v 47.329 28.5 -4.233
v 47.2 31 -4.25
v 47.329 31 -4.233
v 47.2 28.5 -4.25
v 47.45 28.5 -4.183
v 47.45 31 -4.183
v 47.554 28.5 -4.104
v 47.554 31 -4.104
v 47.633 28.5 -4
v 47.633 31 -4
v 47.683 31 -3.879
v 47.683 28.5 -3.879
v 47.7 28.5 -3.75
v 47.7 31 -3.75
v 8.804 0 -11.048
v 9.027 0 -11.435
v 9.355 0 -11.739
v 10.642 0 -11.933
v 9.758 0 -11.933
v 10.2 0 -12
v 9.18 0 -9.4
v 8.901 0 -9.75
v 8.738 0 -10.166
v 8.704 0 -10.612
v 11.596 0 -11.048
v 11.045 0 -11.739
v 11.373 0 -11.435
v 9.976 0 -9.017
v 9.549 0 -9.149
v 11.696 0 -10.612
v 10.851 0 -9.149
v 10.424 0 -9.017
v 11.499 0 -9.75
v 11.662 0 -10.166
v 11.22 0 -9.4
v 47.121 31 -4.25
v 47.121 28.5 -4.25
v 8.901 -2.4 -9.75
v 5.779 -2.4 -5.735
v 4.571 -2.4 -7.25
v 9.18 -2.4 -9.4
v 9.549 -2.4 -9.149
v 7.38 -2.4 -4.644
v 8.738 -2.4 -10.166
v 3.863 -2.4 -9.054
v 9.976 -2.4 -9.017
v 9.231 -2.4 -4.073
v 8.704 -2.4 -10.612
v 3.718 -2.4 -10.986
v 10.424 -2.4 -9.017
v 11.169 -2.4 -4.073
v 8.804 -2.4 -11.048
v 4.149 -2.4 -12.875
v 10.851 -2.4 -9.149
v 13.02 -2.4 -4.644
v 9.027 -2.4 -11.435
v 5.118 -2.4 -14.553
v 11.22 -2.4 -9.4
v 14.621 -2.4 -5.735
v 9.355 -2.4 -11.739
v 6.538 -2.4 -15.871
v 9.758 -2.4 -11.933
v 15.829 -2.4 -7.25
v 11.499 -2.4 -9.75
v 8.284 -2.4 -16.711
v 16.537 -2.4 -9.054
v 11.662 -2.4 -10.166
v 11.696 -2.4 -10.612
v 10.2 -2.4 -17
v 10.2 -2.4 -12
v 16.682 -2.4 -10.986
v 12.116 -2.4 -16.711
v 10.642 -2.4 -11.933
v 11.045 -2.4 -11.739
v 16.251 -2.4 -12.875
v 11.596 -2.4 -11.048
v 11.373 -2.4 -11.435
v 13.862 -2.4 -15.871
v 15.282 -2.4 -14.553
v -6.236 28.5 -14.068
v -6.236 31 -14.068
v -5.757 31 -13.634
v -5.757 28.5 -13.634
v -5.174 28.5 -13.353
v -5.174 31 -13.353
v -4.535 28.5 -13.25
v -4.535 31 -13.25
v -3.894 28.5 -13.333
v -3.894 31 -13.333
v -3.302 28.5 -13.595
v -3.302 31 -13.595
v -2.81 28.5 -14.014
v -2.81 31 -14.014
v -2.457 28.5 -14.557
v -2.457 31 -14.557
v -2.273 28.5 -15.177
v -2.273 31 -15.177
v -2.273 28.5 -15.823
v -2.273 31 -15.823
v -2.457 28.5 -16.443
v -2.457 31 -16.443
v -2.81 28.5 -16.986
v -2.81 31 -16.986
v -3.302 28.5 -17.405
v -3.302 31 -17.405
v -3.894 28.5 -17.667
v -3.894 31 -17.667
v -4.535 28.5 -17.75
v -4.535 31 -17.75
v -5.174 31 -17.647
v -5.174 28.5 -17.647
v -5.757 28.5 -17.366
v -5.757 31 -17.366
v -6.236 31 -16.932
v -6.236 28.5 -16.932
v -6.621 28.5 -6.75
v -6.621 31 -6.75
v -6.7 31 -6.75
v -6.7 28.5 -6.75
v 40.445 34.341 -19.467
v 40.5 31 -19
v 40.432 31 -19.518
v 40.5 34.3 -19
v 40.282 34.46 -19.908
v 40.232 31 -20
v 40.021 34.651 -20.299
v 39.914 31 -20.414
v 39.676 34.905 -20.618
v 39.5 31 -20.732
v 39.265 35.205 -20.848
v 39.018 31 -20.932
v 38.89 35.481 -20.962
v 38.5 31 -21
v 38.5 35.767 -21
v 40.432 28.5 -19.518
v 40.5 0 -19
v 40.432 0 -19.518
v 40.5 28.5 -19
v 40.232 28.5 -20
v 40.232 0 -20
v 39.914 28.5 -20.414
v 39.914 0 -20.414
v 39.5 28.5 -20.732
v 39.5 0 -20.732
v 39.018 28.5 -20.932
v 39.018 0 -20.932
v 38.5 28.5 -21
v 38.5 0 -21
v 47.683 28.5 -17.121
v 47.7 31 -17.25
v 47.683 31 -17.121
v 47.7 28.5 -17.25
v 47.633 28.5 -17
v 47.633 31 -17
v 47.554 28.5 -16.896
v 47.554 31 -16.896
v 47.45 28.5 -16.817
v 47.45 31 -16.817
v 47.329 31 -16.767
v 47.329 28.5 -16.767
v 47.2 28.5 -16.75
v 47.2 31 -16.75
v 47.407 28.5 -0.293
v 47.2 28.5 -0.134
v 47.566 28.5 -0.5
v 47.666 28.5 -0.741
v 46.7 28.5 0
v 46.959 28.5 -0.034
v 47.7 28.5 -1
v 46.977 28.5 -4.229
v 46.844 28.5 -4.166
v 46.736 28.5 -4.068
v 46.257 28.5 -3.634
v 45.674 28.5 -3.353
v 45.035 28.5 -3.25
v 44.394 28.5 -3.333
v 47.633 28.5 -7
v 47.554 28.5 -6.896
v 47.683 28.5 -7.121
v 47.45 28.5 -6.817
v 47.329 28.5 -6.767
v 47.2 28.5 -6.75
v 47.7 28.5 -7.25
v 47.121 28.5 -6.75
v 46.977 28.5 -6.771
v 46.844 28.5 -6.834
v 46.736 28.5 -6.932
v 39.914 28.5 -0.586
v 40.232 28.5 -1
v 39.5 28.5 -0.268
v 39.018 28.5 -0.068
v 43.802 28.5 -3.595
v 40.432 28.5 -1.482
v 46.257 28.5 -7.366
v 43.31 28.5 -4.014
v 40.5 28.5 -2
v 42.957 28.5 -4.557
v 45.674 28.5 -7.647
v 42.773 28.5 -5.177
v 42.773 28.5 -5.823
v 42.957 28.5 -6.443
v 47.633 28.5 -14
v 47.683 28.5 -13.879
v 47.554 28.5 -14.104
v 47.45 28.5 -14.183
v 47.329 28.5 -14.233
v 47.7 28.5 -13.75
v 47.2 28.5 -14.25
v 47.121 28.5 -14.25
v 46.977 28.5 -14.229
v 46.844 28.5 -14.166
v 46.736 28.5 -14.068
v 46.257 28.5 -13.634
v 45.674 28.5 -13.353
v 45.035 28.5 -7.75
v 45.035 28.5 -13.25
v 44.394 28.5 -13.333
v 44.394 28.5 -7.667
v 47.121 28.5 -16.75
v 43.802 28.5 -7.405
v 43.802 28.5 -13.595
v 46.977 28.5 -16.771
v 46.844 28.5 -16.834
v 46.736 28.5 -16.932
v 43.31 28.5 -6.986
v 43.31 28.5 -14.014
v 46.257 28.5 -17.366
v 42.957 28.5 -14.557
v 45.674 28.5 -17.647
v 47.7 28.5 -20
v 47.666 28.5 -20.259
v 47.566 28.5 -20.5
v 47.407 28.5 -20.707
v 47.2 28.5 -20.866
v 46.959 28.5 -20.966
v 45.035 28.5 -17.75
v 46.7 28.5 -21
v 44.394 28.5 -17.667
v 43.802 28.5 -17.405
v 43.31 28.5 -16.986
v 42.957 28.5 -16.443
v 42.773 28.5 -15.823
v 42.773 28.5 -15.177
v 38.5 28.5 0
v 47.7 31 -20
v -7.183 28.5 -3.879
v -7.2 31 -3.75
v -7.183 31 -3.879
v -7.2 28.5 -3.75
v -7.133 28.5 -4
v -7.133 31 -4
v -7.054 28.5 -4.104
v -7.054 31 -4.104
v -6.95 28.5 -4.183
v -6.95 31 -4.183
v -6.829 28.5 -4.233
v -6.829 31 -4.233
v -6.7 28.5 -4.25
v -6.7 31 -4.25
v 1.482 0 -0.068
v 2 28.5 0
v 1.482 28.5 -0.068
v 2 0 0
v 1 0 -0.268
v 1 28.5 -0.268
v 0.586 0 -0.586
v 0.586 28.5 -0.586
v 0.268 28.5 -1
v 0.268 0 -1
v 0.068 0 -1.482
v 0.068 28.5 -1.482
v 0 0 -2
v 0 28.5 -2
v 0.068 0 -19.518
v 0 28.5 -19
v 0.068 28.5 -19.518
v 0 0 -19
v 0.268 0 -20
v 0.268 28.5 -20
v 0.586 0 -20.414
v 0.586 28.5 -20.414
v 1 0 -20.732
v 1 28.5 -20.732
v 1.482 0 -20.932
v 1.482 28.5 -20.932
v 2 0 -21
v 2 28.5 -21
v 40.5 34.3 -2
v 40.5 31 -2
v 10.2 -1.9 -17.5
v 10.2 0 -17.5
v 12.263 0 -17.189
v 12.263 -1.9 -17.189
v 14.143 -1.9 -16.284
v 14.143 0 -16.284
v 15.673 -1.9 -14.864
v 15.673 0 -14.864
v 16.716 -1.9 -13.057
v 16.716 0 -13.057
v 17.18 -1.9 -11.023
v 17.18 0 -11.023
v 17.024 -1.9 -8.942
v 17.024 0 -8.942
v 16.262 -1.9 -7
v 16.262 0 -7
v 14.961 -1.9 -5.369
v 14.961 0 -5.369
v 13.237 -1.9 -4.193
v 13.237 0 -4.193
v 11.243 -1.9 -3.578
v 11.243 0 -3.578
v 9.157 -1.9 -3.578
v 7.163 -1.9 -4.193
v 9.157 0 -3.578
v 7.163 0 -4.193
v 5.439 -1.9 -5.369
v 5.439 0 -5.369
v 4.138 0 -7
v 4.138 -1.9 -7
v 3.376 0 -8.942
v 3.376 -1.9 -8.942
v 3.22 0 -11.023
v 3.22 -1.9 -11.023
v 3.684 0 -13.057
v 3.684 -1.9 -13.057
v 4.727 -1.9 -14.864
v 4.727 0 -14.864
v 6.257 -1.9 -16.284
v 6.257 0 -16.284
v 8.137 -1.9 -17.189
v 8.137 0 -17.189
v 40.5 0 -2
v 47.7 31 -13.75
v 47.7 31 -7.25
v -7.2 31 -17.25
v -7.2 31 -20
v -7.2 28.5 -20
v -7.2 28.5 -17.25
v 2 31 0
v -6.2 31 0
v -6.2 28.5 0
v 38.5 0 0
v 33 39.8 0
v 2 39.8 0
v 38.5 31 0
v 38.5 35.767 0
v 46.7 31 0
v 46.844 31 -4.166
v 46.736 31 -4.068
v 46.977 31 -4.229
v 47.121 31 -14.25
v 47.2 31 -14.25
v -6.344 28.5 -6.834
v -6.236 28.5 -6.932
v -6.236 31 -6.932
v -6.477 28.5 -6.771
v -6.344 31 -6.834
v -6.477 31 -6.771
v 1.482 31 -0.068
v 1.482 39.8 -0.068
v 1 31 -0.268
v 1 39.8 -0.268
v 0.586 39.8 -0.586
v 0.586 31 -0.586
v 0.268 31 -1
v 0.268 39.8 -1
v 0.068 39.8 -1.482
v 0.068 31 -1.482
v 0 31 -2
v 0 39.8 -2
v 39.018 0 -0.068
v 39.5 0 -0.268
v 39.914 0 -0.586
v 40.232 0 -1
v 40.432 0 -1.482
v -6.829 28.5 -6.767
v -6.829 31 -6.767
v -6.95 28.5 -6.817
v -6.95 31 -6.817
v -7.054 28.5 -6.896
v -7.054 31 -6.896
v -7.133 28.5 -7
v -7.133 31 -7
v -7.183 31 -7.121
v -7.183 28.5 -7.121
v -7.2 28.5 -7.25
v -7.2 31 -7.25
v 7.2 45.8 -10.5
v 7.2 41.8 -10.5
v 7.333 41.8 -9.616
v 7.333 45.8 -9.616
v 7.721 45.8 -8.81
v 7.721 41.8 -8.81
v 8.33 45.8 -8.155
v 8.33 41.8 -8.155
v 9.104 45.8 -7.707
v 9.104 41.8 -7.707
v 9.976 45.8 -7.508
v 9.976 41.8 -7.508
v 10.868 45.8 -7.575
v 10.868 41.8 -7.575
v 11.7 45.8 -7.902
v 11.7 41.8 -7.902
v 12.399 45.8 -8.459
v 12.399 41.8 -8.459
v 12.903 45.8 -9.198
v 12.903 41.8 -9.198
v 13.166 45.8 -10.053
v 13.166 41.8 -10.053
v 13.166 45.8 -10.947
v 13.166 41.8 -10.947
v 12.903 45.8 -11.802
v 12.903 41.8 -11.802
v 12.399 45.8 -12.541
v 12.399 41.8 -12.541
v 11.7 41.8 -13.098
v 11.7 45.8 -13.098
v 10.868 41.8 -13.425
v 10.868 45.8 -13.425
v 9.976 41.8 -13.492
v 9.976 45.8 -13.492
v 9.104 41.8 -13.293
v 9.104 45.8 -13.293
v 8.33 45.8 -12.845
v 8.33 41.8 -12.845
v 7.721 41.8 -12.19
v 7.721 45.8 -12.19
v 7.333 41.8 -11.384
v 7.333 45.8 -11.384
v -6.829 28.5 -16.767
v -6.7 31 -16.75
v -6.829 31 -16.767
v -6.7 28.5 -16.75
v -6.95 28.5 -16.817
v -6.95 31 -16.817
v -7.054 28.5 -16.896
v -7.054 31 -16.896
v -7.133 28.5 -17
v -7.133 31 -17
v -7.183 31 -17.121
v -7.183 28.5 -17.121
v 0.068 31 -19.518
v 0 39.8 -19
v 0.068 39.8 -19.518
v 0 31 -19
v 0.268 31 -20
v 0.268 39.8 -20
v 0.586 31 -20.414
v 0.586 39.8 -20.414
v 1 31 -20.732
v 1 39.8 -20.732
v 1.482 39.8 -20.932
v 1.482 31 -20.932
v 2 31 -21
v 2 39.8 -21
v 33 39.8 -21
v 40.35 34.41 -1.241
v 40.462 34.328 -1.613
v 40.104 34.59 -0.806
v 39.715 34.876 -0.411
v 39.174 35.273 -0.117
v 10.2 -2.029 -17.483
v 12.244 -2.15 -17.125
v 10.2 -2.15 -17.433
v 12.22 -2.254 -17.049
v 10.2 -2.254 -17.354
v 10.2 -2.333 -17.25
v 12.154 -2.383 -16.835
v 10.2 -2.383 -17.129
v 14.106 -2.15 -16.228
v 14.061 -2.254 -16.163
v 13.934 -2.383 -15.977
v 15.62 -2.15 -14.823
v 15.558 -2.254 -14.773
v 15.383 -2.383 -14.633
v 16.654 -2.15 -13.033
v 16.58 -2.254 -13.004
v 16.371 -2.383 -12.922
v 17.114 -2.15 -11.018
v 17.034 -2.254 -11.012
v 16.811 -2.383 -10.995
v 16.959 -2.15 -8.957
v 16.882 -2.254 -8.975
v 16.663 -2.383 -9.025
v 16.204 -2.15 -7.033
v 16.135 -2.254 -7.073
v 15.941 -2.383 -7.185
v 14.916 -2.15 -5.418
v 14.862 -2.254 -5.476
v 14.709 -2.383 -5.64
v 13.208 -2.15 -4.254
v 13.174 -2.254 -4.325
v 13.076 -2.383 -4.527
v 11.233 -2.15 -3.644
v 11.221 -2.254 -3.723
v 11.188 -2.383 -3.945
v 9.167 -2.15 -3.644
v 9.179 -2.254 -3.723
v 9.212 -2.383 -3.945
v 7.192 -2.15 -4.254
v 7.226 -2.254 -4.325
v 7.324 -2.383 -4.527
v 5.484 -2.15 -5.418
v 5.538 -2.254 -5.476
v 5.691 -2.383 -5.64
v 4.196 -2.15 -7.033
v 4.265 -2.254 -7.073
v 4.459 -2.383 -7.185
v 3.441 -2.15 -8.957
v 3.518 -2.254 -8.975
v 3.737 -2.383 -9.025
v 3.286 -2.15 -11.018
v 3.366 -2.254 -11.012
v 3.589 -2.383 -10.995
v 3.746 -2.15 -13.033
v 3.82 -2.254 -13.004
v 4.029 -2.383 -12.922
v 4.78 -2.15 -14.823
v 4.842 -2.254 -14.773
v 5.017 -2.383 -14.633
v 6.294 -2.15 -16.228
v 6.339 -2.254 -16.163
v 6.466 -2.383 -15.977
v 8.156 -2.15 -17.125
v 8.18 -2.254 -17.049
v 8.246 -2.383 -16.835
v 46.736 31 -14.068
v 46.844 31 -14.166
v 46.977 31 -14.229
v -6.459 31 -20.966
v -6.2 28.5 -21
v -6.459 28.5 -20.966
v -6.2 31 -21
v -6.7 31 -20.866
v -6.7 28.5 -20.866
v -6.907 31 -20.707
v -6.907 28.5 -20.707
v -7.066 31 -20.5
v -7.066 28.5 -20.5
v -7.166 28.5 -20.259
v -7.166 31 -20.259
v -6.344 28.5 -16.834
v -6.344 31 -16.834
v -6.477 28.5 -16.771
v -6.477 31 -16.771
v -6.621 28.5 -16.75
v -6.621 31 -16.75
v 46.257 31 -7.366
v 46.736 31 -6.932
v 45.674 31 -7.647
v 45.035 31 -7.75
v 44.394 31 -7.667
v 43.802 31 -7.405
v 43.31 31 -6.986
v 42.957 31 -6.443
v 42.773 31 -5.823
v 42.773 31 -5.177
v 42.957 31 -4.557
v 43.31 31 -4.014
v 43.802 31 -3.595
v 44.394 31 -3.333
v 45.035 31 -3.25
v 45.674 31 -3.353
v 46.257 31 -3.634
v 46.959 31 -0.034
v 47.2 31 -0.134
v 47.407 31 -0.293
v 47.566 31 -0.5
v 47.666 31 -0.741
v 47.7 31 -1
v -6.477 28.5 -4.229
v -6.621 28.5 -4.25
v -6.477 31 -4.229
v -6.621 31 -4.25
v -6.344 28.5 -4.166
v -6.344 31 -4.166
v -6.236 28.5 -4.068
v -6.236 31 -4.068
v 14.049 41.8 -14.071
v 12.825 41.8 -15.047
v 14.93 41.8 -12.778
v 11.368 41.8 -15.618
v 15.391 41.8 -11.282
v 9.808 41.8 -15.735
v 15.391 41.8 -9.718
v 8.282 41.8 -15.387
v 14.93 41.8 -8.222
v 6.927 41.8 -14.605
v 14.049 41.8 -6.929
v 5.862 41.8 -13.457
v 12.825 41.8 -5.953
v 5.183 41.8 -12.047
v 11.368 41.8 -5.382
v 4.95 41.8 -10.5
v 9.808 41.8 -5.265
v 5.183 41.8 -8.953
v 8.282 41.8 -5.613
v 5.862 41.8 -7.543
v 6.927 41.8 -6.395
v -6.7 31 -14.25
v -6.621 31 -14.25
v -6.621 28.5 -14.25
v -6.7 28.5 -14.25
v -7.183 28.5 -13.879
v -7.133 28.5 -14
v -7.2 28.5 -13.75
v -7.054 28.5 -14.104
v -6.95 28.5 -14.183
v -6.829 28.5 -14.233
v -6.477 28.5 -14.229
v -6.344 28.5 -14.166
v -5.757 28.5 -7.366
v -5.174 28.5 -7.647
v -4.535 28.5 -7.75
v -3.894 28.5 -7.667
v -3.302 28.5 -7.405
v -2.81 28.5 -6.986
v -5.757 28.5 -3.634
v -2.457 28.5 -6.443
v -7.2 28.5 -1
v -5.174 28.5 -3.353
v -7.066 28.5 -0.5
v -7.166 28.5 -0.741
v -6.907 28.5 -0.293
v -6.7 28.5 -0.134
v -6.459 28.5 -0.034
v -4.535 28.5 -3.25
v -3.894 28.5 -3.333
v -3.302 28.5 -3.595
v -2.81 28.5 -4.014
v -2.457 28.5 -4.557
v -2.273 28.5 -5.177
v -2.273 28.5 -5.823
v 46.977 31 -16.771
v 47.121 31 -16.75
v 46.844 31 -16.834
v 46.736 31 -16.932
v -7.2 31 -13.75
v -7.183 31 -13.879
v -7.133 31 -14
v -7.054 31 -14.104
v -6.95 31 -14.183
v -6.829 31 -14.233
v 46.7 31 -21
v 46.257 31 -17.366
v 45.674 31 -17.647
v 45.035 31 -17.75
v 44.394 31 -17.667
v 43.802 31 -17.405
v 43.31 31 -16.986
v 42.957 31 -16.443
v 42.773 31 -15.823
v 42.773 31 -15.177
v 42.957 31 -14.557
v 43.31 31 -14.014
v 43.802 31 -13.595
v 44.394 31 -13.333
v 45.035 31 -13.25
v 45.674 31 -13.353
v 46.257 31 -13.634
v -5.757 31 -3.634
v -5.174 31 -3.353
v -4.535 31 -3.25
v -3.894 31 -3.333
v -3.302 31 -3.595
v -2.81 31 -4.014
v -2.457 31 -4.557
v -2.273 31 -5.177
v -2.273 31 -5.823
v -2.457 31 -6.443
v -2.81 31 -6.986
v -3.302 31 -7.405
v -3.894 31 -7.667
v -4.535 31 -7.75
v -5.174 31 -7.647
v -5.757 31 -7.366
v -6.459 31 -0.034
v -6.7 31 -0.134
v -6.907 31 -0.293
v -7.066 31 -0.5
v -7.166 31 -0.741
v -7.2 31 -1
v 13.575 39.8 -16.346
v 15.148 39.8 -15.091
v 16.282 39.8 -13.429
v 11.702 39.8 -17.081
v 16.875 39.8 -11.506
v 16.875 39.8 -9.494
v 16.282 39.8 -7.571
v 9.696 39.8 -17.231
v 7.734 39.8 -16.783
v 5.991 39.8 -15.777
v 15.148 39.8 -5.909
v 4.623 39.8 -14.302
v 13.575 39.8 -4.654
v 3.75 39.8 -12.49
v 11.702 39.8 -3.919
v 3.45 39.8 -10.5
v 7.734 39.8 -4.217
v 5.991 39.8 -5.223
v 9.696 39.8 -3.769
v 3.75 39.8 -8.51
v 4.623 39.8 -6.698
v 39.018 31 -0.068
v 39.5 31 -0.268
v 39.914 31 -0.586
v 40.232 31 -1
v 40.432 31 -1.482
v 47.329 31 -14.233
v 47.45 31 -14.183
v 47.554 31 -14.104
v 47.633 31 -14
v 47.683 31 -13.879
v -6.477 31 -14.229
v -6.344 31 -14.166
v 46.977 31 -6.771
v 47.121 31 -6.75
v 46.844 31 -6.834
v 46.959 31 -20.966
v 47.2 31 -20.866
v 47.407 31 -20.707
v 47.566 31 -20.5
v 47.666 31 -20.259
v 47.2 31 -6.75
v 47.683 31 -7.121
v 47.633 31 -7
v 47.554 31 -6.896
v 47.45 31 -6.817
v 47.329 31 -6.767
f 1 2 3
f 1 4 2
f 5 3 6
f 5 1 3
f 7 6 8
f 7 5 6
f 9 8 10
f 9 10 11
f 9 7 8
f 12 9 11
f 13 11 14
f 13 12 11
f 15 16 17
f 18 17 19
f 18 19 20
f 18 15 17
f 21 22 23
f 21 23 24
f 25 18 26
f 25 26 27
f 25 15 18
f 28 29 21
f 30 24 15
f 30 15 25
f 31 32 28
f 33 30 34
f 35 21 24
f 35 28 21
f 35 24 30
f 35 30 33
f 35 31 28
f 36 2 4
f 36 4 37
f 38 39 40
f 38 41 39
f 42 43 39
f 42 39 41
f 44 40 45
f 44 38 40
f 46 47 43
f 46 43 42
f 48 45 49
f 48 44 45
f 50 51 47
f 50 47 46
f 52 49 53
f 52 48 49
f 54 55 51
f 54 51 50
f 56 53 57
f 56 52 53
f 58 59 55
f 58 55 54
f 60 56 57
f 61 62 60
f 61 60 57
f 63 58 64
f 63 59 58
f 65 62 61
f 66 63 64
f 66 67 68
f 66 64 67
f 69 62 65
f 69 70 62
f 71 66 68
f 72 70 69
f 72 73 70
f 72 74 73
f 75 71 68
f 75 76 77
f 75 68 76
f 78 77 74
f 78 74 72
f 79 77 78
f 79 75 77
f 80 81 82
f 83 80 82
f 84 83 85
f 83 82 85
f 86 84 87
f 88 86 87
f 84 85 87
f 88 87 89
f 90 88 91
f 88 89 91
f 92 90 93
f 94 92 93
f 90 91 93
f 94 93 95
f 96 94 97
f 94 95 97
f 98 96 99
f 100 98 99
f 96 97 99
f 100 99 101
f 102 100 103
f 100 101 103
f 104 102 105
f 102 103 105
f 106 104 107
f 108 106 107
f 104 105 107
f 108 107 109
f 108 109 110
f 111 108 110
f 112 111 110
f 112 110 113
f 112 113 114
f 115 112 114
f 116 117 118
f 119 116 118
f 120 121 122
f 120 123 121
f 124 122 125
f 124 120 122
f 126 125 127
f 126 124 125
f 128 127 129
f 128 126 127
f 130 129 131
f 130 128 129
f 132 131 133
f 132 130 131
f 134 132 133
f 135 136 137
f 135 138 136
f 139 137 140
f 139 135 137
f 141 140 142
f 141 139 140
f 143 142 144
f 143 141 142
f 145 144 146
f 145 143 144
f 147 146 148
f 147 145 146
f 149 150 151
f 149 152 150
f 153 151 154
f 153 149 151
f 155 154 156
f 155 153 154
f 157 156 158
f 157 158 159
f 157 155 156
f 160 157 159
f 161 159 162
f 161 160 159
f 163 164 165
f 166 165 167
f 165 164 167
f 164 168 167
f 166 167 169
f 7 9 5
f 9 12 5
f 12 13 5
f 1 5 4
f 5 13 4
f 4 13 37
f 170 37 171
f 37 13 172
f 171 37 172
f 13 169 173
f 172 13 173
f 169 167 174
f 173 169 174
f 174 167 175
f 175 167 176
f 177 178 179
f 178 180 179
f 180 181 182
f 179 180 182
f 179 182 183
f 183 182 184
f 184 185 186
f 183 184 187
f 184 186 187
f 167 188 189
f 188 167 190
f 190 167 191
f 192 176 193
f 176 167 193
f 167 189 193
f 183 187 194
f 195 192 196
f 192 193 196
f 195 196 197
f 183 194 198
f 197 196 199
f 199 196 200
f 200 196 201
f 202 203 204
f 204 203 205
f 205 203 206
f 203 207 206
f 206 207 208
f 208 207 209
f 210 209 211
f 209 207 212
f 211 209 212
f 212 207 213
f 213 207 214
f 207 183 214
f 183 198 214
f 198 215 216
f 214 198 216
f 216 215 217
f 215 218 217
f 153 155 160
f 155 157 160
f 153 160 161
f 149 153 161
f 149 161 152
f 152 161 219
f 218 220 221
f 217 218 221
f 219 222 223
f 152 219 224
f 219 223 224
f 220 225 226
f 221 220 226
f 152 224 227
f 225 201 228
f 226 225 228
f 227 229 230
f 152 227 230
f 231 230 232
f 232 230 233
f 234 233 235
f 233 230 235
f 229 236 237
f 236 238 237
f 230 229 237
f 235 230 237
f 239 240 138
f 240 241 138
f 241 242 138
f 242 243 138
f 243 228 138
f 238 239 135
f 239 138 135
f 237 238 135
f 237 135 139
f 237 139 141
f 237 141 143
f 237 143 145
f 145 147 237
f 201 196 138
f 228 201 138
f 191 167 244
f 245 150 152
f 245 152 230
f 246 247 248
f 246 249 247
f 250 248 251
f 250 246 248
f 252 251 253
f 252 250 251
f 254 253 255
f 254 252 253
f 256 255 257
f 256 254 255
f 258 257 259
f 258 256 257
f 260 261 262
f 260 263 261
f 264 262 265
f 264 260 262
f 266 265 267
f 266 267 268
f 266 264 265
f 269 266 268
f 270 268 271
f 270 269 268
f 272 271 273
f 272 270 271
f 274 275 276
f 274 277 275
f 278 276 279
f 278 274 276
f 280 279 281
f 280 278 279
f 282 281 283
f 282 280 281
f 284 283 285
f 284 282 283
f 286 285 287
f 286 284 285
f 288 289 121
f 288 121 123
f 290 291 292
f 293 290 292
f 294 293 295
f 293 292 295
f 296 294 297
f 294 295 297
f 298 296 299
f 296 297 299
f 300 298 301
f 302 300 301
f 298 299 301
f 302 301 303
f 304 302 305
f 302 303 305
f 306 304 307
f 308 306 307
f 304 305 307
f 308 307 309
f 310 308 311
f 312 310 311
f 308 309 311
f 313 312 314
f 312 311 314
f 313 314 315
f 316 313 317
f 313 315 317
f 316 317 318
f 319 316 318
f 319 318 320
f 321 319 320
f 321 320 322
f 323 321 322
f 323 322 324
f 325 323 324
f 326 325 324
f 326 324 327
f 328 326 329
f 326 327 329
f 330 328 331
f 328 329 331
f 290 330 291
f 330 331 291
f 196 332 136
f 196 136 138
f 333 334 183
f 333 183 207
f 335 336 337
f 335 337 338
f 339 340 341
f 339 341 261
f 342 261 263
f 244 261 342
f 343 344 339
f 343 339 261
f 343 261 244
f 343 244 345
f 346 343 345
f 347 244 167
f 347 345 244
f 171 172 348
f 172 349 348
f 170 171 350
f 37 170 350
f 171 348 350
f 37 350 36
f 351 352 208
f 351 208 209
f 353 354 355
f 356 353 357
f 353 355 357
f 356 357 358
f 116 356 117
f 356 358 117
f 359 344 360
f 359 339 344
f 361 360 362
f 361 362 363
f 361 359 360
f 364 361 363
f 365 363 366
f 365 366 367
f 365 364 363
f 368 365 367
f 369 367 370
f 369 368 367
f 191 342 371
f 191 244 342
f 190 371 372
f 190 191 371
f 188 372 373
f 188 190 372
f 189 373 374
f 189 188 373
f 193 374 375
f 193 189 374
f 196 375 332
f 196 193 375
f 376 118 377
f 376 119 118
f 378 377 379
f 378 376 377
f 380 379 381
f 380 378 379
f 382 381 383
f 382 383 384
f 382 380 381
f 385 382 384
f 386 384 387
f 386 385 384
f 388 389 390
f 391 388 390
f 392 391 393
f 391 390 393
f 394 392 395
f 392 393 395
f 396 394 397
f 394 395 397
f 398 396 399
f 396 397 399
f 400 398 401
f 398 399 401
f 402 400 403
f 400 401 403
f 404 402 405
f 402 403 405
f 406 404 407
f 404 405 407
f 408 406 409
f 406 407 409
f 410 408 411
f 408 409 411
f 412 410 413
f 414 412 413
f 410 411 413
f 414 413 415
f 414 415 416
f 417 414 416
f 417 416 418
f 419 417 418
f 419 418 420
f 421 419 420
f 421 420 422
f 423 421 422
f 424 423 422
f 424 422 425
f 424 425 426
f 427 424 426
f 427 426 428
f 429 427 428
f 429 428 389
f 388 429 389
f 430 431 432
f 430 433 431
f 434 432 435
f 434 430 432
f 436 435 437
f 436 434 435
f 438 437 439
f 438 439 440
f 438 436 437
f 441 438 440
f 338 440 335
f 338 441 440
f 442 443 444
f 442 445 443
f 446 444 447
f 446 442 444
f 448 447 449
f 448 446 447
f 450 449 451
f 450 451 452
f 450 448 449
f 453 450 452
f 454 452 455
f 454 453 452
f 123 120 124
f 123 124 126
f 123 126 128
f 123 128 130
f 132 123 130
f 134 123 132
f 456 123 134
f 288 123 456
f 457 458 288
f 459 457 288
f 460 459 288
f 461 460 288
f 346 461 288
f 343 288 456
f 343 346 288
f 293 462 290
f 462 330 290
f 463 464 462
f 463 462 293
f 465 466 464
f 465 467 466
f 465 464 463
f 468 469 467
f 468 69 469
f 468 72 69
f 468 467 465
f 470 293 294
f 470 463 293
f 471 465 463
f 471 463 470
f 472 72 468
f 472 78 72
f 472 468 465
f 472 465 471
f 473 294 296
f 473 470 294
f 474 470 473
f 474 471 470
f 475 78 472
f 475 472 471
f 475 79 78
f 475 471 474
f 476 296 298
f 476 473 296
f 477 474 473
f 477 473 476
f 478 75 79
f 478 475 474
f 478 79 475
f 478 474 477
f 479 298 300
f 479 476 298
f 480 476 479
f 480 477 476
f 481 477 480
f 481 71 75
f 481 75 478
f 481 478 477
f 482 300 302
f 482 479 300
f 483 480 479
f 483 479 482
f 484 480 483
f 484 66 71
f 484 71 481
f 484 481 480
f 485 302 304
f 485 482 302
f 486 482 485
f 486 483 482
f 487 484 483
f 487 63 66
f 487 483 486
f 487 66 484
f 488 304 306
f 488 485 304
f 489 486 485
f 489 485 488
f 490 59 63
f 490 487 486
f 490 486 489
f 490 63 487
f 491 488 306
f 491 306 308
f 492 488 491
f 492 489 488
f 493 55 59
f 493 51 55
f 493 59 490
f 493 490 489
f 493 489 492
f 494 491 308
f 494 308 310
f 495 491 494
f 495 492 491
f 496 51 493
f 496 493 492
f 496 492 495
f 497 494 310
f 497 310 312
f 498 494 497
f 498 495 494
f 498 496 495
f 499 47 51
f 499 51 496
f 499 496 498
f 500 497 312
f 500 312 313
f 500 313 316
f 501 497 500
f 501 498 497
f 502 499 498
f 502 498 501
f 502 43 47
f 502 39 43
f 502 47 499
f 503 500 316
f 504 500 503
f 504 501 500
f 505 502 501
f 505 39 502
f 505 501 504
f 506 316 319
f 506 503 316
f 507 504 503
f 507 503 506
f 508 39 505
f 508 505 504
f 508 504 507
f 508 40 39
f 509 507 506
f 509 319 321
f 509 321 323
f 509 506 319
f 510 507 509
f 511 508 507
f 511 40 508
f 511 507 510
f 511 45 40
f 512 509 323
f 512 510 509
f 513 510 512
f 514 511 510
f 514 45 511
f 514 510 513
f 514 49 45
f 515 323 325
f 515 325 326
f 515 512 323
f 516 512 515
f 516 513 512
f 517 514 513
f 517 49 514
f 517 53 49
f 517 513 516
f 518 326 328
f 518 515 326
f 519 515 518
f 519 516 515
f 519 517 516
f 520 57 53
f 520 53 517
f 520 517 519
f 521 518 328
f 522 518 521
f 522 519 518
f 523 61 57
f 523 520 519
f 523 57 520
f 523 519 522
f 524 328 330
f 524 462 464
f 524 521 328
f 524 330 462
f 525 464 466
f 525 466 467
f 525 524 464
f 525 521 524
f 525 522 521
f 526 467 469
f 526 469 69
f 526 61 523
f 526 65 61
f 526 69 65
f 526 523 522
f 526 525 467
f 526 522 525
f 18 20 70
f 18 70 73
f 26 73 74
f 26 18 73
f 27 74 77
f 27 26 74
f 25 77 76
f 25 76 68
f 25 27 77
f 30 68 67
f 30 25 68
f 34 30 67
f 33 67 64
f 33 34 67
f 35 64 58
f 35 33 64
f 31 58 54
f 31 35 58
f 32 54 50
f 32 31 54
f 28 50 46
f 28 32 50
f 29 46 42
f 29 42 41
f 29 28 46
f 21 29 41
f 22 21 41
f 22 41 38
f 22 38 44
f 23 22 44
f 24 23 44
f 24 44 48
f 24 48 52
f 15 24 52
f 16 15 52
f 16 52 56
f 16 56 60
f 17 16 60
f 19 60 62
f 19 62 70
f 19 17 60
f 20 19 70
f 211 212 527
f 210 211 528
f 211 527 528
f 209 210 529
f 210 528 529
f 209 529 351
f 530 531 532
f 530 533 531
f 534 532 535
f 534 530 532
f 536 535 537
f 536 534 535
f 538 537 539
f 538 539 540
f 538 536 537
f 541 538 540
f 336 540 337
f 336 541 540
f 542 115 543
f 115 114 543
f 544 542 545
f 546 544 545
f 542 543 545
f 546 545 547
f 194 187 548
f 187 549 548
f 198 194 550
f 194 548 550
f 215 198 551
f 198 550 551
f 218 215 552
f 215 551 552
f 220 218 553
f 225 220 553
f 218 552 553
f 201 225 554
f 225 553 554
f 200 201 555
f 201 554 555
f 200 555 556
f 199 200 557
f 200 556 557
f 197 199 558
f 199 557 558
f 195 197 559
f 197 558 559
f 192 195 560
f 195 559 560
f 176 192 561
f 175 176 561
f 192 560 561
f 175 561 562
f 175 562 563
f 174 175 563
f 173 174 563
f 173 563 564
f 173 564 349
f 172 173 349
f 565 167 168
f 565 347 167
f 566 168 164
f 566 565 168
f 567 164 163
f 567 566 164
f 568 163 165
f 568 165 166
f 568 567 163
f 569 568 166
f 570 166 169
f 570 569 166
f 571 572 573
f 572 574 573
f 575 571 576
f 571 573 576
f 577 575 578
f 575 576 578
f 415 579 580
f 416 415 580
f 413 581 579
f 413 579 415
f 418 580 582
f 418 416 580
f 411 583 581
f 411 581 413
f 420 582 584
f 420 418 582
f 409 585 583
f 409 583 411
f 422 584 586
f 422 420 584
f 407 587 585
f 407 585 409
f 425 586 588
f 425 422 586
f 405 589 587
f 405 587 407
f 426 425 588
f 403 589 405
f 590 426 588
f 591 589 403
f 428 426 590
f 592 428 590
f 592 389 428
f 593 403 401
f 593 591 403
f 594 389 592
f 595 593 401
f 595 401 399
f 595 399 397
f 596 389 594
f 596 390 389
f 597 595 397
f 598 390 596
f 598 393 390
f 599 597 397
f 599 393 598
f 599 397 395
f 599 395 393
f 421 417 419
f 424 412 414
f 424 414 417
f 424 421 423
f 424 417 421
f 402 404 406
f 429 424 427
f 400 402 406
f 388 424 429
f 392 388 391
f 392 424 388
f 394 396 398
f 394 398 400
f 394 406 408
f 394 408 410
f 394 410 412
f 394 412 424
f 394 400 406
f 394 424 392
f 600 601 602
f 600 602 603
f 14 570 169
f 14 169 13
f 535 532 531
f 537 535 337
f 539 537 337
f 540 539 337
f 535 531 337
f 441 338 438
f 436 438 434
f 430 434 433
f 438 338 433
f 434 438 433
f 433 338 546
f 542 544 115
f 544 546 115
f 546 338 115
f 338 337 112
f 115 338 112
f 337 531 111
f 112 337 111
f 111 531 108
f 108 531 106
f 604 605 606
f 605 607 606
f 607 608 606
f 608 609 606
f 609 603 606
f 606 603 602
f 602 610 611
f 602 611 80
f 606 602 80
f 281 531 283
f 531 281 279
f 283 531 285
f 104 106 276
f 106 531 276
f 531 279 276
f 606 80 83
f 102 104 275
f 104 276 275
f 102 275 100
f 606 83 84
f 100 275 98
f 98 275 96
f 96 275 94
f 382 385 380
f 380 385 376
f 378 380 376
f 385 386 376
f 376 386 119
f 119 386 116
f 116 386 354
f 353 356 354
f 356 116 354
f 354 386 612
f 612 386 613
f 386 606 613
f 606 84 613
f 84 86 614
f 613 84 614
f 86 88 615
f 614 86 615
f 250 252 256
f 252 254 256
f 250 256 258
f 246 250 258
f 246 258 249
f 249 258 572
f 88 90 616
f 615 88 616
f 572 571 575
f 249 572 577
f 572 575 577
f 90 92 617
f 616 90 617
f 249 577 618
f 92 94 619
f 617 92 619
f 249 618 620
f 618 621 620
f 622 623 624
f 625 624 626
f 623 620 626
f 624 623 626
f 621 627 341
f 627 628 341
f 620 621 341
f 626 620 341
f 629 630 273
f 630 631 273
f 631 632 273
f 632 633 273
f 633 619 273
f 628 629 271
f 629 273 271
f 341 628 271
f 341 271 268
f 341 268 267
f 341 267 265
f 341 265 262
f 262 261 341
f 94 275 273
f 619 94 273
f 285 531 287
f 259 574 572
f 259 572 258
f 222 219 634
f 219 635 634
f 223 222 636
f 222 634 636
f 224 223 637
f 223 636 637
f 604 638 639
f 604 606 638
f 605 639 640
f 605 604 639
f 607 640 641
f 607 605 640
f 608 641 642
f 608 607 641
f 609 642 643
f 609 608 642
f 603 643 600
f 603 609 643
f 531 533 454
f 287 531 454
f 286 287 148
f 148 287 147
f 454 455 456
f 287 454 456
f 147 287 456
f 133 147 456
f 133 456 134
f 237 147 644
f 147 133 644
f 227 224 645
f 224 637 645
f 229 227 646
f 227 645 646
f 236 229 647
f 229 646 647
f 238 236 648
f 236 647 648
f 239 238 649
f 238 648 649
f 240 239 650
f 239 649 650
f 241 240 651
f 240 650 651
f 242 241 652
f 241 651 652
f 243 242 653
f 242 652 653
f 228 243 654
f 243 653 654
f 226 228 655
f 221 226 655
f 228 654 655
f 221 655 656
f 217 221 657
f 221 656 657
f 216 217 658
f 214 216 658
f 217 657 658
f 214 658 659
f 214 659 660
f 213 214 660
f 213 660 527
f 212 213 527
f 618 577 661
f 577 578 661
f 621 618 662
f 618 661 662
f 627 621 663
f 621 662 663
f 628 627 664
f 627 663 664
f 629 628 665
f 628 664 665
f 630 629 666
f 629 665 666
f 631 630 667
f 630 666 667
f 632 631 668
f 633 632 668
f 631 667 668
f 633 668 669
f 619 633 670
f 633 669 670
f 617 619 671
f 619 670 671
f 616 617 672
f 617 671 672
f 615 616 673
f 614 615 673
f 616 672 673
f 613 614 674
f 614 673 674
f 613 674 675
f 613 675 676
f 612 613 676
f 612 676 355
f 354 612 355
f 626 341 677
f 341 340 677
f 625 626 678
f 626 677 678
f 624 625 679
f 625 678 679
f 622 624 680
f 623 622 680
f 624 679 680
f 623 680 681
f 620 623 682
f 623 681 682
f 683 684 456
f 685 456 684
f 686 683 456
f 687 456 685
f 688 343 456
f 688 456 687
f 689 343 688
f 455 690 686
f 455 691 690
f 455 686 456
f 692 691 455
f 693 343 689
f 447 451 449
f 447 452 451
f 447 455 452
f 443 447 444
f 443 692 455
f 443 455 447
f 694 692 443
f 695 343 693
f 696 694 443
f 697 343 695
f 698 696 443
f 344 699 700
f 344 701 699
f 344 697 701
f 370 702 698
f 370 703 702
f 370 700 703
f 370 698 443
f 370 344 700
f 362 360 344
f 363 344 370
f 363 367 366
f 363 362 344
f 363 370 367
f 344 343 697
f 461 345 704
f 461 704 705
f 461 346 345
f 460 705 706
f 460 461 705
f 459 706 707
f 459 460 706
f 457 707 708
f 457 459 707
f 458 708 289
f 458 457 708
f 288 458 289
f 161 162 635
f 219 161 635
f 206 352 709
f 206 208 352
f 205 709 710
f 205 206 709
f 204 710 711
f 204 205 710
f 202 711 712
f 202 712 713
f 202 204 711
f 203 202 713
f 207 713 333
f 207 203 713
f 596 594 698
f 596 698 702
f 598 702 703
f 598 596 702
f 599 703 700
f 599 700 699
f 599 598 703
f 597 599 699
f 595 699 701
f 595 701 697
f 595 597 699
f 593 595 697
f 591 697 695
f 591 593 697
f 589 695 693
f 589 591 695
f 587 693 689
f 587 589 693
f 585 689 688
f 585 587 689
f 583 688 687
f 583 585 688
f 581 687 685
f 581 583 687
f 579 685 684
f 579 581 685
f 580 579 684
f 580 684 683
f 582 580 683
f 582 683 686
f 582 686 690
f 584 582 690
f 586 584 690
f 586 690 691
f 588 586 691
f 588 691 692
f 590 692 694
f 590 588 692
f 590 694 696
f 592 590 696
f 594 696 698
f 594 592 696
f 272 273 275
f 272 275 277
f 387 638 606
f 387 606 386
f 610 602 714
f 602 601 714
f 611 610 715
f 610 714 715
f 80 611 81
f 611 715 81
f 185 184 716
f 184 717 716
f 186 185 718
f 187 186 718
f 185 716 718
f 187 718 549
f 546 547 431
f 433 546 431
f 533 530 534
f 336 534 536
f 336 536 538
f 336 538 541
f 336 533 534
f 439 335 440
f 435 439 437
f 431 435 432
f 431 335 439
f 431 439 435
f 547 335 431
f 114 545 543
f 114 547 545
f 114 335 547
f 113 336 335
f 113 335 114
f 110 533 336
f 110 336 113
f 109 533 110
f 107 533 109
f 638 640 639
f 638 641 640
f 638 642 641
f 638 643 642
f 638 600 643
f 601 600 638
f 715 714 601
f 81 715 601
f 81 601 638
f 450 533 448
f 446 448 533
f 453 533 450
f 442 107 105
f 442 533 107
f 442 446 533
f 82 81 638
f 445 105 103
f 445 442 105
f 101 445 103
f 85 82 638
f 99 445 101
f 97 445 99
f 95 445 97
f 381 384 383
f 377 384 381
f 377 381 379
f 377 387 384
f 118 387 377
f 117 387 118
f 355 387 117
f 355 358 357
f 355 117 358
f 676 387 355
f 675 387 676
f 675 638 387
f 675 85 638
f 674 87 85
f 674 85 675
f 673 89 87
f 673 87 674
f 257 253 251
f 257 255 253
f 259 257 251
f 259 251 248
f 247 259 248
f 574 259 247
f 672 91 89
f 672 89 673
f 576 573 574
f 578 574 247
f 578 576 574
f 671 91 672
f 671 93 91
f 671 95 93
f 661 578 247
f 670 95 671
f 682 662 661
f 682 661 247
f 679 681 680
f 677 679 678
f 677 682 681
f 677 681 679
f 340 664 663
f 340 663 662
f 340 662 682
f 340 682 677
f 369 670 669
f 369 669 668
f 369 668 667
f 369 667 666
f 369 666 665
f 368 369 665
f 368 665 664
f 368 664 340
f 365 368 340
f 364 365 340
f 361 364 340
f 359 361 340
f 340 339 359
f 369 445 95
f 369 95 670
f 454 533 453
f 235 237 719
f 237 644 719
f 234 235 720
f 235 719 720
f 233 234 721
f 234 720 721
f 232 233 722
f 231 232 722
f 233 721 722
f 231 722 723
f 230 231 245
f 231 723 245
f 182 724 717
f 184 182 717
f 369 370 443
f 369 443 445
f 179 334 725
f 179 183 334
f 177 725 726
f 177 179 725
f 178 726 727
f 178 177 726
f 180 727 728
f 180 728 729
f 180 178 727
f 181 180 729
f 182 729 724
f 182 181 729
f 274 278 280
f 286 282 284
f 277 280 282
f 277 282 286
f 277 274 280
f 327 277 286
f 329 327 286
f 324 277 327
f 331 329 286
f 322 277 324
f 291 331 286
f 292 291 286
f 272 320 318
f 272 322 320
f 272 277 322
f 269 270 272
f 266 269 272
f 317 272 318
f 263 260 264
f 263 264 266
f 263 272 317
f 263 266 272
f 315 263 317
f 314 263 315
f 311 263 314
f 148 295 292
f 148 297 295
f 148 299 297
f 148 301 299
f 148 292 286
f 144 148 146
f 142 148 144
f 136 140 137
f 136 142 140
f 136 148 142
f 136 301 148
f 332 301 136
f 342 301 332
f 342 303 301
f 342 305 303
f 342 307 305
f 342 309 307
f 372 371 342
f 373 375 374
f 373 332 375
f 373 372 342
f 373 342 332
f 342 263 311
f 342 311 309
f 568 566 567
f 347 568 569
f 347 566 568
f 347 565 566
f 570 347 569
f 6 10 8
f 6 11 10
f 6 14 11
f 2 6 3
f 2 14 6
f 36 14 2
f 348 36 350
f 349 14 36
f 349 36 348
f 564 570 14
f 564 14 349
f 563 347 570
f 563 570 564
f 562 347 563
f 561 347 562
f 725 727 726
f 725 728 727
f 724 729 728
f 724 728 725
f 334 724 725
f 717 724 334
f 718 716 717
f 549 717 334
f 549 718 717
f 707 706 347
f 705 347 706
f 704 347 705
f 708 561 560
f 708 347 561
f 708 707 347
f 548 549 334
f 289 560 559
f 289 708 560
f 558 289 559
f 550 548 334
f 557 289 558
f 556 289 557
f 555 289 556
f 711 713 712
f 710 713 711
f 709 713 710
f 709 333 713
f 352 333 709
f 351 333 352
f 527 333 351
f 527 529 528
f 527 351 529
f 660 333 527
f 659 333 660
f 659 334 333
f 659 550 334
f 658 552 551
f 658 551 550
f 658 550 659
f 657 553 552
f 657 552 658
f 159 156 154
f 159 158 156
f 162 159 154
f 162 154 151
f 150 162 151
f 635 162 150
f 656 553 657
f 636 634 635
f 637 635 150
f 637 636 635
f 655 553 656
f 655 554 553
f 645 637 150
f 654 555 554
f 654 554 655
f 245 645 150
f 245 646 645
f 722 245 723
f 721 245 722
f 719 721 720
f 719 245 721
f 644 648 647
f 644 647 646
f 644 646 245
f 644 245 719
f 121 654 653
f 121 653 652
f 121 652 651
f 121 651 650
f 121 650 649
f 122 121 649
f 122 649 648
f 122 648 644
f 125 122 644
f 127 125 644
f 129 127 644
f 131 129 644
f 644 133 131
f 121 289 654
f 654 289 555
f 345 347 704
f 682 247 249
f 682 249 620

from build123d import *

# Parameters (mm, degrees)
EXTRUSION1_DEPTH = 21
ESQUISSE2_W      = 21
ESQUISSE2_H      = 2.5
EXTRUSION2_DEPTH = 7.2
ESQUISSE3_W      = 21
ESQUISSE3_H      = 2.5
EXTRUSION3_DEPTH = 7.2
EXTRUSION4_REACH = 62.641
ESQUISSE4_R      = 2.25
CONG_1_R         = 1
CONG_2_R         = 2
ESQUISSE5_R      = 3
EXTRUSION5_DEPTH = 6
ESQUISSE7_R      = 6.75
EXTRUSION6_DEPTH = 2
CHANFREIN1_SIZE2 = 1.5
CHANFREIN1_SIZE  = 2
EXTRUSION7_REACH = 62.641
ESQUISSE8_W      = 1
ESQUISSE8_H      = 2.5
CONG_3_R         = 0.5
ESQUISSE9_R      = 7
ESQUISSE9_R_2    = 1.5
EXTRUSION8_DEPTH = 2.4
CONG_4_R         = 0.5


with BuildPart() as part:
    # Esquisse1 → Extrusion1 (new body)
    with BuildSketch(Plane.XY):
        Polygon((0, 0), (40.5, 0), (40.5, 34.3), (33, 39.8), (0, 39.8), align=None)
    extrude(amount=-EXTRUSION1_DEPTH)

    # Esquisse2 → Extrusion2 (add)
    with BuildSketch(Plane(origin=(40.5, 0, 0), x_dir=(0, 0, -1), z_dir=(1, 0, 0))):
        with Locations((10.5, 29.75)):
            Rectangle(ESQUISSE2_W, ESQUISSE2_H)
    extrude(amount=EXTRUSION2_DEPTH)

    # Esquisse3 → Extrusion3 (add)
    with BuildSketch(Plane.ZY):
        with Locations((-10.5, 29.75)):
            Rectangle(ESQUISSE3_W, ESQUISSE3_H)
    extrude(amount=EXTRUSION3_DEPTH)

    # Esquisse4 → Extrusion4 (cut, up to next)
    with BuildSketch(Plane(origin=(0, 31, 0), x_dir=(-1, 0, 0), z_dir=(0, 1, 0)), mode=Mode.PRIVATE) as extrusion4_sk1:
        with Locations((4.5, -15.5)):
            Circle(ESQUISSE4_R)
    extrusion4_tool1 = extrude(extrusion4_sk1.sketch, amount=-EXTRUSION4_REACH, mode=Mode.PRIVATE) & part.part
    # Esquisse4 → Extrusion4 (cut, up to next)
    with BuildSketch(Plane(origin=(0, 31, 0), x_dir=(-1, 0, 0), z_dir=(0, 1, 0)), mode=Mode.PRIVATE) as extrusion4_sk2:
        with Locations(Location((-45, -15.5, 0), (0, 0, 90))):
            Circle(ESQUISSE4_R)
    extrusion4_tool2 = extrude(extrusion4_sk2.sketch, amount=-EXTRUSION4_REACH, mode=Mode.PRIVATE) & part.part
    # Esquisse4 → Extrusion4 (cut, up to next)
    with BuildSketch(Plane(origin=(0, 31, 0), x_dir=(-1, 0, 0), z_dir=(0, 1, 0)), mode=Mode.PRIVATE) as extrusion4_sk3:
        with Locations((-45, -5.5)):
            Circle(ESQUISSE4_R)
    extrusion4_tool3 = extrude(extrusion4_sk3.sketch, amount=-EXTRUSION4_REACH, mode=Mode.PRIVATE) & part.part
    # Esquisse4 → Extrusion4 (cut, up to next)
    with BuildSketch(Plane(origin=(0, 31, 0), x_dir=(-1, 0, 0), z_dir=(0, 1, 0)), mode=Mode.PRIVATE) as extrusion4_sk4:
        with Locations(Location((4.5, -5.5, 0), (0, 0, 90))):
            Circle(ESQUISSE4_R)
    extrusion4_tool4 = extrude(extrusion4_sk4.sketch, amount=-EXTRUSION4_REACH, mode=Mode.PRIVATE) & part.part
    add(extrusion4_tool1.solids().sort_by_distance((-4.5, 31, -15.5))[0], mode=Mode.SUBTRACT)
    add(extrusion4_tool2.solids().sort_by_distance((45, 31, -15.5))[0], mode=Mode.SUBTRACT)
    add(extrusion4_tool3.solids().sort_by_distance((45, 31, -5.5))[0], mode=Mode.SUBTRACT)
    add(extrusion4_tool4.solids().sort_by_distance((-4.5, 31, -5.5))[0], mode=Mode.SUBTRACT)

    # Congé1
    cong_1_edges = [part.edges().sort_by_distance(p)[0] for p in [
        (47.7, 29.75, 0),
        (47.7, 29.75, -21),
        (-7.2, 29.75, -21),
        (-7.2, 29.75, 0),
    ]]
    fillet(cong_1_edges, radius=CONG_1_R)

    # Congé2
    cong_2_edges = [part.edges().sort_by_distance(p)[0] for p in [
        (0, 35.4, -21),
        (0, 14.25, -21),
        (0, 35.4, 0),
        (0, 14.25, 0),
        (40.5, 32.65, 0),
        (40.5, 14.25, 0),
        (40.5, 32.65, -21),
        (40.5, 14.25, -21),
    ]]
    fillet(cong_2_edges, radius=CONG_2_R)

    # Esquisse5 → Extrusion5 (add)
    with BuildSketch(Plane(origin=(0, 39.8, 0), x_dir=(-1, 0, 0), z_dir=(0, 1, 0))):
        with Locations((-10.2, -10.5)):
            Circle(ESQUISSE5_R)
    extrude(amount=EXTRUSION5_DEPTH)

    # Esquisse7 → Extrusion6 (add)
    with BuildSketch(Plane(origin=(0, 39.8, 0), x_dir=(-1, 0, 0), z_dir=(0, 1, 0))):
        with Locations((-10.2, -10.5)):
            Circle(ESQUISSE7_R)
    extrude(amount=EXTRUSION6_DEPTH)

    # Chanfrein1
    chanfrein1_edges = [part.edges().sort_by_distance(p)[0] for p in [
        (16.95, 41.8, -10.5),
    ]]
    chanfrein1_side = [part.faces().sort_by_distance(p)[0] for p in [
        (16.95, 41.77, -10.5),
    ]]
    chamfer(chanfrein1_edges, length=CHANFREIN1_SIZE - 0.0001, length2=CHANFREIN1_SIZE2 - 0.0001, reference=chanfrein1_side[0])  # a hair under: the kernel refuses the full size

    # Esquisse8 → Extrusion7 (cut, up to next)
    with BuildSketch(Plane(origin=(0, 31, 0), x_dir=(-1, 0, 0), z_dir=(0, 1, 0)), mode=Mode.PRIVATE) as extrusion7_sk1:
        with Locations((6.7, -15.5)):
            Rectangle(ESQUISSE8_W, ESQUISSE8_H)
    extrusion7_tool1 = extrude(extrusion7_sk1.sketch, amount=-EXTRUSION7_REACH, mode=Mode.PRIVATE) & part.part
    # Esquisse8 → Extrusion7 (cut, up to next)
    with BuildSketch(Plane(origin=(0, 31, 0), x_dir=(-1, 0, 0), z_dir=(0, 1, 0)), mode=Mode.PRIVATE) as extrusion7_sk2:
        with Locations((6.7, -5.5)):
            Rectangle(ESQUISSE8_W, ESQUISSE8_H)
    extrusion7_tool2 = extrude(extrusion7_sk2.sketch, amount=-EXTRUSION7_REACH, mode=Mode.PRIVATE) & part.part
    # Esquisse8 → Extrusion7 (cut, up to next)
    with BuildSketch(Plane(origin=(0, 31, 0), x_dir=(-1, 0, 0), z_dir=(0, 1, 0)), mode=Mode.PRIVATE) as extrusion7_sk3:
        with Locations((-47.2, -15.5)):
            Rectangle(ESQUISSE8_W, ESQUISSE8_H)
    extrusion7_tool3 = extrude(extrusion7_sk3.sketch, amount=-EXTRUSION7_REACH, mode=Mode.PRIVATE) & part.part
    # Esquisse8 → Extrusion7 (cut, up to next)
    with BuildSketch(Plane(origin=(0, 31, 0), x_dir=(-1, 0, 0), z_dir=(0, 1, 0)), mode=Mode.PRIVATE) as extrusion7_sk4:
        with Locations((-47.2, -5.5)):
            Rectangle(ESQUISSE8_W, ESQUISSE8_H)
    extrusion7_tool4 = extrude(extrusion7_sk4.sketch, amount=-EXTRUSION7_REACH, mode=Mode.PRIVATE) & part.part
    add(extrusion7_tool1.solids().sort_by_distance((-6.7, 31, -15.5))[0], mode=Mode.SUBTRACT)
    add(extrusion7_tool2.solids().sort_by_distance((-6.7, 31, -5.5))[0], mode=Mode.SUBTRACT)
    add(extrusion7_tool3.solids().sort_by_distance((47.2, 31, -15.5))[0], mode=Mode.SUBTRACT)
    add(extrusion7_tool4.solids().sort_by_distance((47.2, 31, -5.5))[0], mode=Mode.SUBTRACT)

    # Congé3
    cong_3_edges = [part.edges().sort_by_distance(p)[0] for p in [
        (-7.2, 29.75, -14.25),
        (-7.2, 29.75, -16.75),
        (-6.370828693, 29.75, -16.75),
        (-6.370828693, 29.75, -14.25),
        (-6.370828693, 29.75, -6.75),
        (-6.370828693, 29.75, -4.25),
        (-7.2, 29.75, -6.75),
        (-7.2, 29.75, -4.25),
        (46.870828693, 29.75, -14.25),
        (46.870828693, 29.75, -16.75),
        (47.7, 29.75, -14.25),
        (47.7, 29.75, -16.75),
        (47.7, 29.75, -6.75),
        (47.7, 29.75, -4.25),
        (46.870828693, 29.75, -6.75),
        (46.870828693, 29.75, -4.25),
    ]]
    fillet(cong_3_edges, radius=CONG_3_R)

    # Esquisse9 → Extrusion8 (add)
    with BuildSketch(Plane.XZ):
        with Locations(Location((10.2, -10.5, 0), (0, 0, 270))):
            Circle(ESQUISSE9_R)
        with Locations(Location((10.2, -10.5, 0), (0, 0, 270))):
            Circle(ESQUISSE9_R_2, mode=Mode.SUBTRACT)
    extrude(amount=EXTRUSION8_DEPTH)

    # Congé4
    cong_4_edges = [part.edges().sort_by_distance(p)[0] for p in [
        (10.2, -2.4, -3.5),
    ]]
    fillet(cong_4_edges, radius=CONG_4_R)


solid = part.part
